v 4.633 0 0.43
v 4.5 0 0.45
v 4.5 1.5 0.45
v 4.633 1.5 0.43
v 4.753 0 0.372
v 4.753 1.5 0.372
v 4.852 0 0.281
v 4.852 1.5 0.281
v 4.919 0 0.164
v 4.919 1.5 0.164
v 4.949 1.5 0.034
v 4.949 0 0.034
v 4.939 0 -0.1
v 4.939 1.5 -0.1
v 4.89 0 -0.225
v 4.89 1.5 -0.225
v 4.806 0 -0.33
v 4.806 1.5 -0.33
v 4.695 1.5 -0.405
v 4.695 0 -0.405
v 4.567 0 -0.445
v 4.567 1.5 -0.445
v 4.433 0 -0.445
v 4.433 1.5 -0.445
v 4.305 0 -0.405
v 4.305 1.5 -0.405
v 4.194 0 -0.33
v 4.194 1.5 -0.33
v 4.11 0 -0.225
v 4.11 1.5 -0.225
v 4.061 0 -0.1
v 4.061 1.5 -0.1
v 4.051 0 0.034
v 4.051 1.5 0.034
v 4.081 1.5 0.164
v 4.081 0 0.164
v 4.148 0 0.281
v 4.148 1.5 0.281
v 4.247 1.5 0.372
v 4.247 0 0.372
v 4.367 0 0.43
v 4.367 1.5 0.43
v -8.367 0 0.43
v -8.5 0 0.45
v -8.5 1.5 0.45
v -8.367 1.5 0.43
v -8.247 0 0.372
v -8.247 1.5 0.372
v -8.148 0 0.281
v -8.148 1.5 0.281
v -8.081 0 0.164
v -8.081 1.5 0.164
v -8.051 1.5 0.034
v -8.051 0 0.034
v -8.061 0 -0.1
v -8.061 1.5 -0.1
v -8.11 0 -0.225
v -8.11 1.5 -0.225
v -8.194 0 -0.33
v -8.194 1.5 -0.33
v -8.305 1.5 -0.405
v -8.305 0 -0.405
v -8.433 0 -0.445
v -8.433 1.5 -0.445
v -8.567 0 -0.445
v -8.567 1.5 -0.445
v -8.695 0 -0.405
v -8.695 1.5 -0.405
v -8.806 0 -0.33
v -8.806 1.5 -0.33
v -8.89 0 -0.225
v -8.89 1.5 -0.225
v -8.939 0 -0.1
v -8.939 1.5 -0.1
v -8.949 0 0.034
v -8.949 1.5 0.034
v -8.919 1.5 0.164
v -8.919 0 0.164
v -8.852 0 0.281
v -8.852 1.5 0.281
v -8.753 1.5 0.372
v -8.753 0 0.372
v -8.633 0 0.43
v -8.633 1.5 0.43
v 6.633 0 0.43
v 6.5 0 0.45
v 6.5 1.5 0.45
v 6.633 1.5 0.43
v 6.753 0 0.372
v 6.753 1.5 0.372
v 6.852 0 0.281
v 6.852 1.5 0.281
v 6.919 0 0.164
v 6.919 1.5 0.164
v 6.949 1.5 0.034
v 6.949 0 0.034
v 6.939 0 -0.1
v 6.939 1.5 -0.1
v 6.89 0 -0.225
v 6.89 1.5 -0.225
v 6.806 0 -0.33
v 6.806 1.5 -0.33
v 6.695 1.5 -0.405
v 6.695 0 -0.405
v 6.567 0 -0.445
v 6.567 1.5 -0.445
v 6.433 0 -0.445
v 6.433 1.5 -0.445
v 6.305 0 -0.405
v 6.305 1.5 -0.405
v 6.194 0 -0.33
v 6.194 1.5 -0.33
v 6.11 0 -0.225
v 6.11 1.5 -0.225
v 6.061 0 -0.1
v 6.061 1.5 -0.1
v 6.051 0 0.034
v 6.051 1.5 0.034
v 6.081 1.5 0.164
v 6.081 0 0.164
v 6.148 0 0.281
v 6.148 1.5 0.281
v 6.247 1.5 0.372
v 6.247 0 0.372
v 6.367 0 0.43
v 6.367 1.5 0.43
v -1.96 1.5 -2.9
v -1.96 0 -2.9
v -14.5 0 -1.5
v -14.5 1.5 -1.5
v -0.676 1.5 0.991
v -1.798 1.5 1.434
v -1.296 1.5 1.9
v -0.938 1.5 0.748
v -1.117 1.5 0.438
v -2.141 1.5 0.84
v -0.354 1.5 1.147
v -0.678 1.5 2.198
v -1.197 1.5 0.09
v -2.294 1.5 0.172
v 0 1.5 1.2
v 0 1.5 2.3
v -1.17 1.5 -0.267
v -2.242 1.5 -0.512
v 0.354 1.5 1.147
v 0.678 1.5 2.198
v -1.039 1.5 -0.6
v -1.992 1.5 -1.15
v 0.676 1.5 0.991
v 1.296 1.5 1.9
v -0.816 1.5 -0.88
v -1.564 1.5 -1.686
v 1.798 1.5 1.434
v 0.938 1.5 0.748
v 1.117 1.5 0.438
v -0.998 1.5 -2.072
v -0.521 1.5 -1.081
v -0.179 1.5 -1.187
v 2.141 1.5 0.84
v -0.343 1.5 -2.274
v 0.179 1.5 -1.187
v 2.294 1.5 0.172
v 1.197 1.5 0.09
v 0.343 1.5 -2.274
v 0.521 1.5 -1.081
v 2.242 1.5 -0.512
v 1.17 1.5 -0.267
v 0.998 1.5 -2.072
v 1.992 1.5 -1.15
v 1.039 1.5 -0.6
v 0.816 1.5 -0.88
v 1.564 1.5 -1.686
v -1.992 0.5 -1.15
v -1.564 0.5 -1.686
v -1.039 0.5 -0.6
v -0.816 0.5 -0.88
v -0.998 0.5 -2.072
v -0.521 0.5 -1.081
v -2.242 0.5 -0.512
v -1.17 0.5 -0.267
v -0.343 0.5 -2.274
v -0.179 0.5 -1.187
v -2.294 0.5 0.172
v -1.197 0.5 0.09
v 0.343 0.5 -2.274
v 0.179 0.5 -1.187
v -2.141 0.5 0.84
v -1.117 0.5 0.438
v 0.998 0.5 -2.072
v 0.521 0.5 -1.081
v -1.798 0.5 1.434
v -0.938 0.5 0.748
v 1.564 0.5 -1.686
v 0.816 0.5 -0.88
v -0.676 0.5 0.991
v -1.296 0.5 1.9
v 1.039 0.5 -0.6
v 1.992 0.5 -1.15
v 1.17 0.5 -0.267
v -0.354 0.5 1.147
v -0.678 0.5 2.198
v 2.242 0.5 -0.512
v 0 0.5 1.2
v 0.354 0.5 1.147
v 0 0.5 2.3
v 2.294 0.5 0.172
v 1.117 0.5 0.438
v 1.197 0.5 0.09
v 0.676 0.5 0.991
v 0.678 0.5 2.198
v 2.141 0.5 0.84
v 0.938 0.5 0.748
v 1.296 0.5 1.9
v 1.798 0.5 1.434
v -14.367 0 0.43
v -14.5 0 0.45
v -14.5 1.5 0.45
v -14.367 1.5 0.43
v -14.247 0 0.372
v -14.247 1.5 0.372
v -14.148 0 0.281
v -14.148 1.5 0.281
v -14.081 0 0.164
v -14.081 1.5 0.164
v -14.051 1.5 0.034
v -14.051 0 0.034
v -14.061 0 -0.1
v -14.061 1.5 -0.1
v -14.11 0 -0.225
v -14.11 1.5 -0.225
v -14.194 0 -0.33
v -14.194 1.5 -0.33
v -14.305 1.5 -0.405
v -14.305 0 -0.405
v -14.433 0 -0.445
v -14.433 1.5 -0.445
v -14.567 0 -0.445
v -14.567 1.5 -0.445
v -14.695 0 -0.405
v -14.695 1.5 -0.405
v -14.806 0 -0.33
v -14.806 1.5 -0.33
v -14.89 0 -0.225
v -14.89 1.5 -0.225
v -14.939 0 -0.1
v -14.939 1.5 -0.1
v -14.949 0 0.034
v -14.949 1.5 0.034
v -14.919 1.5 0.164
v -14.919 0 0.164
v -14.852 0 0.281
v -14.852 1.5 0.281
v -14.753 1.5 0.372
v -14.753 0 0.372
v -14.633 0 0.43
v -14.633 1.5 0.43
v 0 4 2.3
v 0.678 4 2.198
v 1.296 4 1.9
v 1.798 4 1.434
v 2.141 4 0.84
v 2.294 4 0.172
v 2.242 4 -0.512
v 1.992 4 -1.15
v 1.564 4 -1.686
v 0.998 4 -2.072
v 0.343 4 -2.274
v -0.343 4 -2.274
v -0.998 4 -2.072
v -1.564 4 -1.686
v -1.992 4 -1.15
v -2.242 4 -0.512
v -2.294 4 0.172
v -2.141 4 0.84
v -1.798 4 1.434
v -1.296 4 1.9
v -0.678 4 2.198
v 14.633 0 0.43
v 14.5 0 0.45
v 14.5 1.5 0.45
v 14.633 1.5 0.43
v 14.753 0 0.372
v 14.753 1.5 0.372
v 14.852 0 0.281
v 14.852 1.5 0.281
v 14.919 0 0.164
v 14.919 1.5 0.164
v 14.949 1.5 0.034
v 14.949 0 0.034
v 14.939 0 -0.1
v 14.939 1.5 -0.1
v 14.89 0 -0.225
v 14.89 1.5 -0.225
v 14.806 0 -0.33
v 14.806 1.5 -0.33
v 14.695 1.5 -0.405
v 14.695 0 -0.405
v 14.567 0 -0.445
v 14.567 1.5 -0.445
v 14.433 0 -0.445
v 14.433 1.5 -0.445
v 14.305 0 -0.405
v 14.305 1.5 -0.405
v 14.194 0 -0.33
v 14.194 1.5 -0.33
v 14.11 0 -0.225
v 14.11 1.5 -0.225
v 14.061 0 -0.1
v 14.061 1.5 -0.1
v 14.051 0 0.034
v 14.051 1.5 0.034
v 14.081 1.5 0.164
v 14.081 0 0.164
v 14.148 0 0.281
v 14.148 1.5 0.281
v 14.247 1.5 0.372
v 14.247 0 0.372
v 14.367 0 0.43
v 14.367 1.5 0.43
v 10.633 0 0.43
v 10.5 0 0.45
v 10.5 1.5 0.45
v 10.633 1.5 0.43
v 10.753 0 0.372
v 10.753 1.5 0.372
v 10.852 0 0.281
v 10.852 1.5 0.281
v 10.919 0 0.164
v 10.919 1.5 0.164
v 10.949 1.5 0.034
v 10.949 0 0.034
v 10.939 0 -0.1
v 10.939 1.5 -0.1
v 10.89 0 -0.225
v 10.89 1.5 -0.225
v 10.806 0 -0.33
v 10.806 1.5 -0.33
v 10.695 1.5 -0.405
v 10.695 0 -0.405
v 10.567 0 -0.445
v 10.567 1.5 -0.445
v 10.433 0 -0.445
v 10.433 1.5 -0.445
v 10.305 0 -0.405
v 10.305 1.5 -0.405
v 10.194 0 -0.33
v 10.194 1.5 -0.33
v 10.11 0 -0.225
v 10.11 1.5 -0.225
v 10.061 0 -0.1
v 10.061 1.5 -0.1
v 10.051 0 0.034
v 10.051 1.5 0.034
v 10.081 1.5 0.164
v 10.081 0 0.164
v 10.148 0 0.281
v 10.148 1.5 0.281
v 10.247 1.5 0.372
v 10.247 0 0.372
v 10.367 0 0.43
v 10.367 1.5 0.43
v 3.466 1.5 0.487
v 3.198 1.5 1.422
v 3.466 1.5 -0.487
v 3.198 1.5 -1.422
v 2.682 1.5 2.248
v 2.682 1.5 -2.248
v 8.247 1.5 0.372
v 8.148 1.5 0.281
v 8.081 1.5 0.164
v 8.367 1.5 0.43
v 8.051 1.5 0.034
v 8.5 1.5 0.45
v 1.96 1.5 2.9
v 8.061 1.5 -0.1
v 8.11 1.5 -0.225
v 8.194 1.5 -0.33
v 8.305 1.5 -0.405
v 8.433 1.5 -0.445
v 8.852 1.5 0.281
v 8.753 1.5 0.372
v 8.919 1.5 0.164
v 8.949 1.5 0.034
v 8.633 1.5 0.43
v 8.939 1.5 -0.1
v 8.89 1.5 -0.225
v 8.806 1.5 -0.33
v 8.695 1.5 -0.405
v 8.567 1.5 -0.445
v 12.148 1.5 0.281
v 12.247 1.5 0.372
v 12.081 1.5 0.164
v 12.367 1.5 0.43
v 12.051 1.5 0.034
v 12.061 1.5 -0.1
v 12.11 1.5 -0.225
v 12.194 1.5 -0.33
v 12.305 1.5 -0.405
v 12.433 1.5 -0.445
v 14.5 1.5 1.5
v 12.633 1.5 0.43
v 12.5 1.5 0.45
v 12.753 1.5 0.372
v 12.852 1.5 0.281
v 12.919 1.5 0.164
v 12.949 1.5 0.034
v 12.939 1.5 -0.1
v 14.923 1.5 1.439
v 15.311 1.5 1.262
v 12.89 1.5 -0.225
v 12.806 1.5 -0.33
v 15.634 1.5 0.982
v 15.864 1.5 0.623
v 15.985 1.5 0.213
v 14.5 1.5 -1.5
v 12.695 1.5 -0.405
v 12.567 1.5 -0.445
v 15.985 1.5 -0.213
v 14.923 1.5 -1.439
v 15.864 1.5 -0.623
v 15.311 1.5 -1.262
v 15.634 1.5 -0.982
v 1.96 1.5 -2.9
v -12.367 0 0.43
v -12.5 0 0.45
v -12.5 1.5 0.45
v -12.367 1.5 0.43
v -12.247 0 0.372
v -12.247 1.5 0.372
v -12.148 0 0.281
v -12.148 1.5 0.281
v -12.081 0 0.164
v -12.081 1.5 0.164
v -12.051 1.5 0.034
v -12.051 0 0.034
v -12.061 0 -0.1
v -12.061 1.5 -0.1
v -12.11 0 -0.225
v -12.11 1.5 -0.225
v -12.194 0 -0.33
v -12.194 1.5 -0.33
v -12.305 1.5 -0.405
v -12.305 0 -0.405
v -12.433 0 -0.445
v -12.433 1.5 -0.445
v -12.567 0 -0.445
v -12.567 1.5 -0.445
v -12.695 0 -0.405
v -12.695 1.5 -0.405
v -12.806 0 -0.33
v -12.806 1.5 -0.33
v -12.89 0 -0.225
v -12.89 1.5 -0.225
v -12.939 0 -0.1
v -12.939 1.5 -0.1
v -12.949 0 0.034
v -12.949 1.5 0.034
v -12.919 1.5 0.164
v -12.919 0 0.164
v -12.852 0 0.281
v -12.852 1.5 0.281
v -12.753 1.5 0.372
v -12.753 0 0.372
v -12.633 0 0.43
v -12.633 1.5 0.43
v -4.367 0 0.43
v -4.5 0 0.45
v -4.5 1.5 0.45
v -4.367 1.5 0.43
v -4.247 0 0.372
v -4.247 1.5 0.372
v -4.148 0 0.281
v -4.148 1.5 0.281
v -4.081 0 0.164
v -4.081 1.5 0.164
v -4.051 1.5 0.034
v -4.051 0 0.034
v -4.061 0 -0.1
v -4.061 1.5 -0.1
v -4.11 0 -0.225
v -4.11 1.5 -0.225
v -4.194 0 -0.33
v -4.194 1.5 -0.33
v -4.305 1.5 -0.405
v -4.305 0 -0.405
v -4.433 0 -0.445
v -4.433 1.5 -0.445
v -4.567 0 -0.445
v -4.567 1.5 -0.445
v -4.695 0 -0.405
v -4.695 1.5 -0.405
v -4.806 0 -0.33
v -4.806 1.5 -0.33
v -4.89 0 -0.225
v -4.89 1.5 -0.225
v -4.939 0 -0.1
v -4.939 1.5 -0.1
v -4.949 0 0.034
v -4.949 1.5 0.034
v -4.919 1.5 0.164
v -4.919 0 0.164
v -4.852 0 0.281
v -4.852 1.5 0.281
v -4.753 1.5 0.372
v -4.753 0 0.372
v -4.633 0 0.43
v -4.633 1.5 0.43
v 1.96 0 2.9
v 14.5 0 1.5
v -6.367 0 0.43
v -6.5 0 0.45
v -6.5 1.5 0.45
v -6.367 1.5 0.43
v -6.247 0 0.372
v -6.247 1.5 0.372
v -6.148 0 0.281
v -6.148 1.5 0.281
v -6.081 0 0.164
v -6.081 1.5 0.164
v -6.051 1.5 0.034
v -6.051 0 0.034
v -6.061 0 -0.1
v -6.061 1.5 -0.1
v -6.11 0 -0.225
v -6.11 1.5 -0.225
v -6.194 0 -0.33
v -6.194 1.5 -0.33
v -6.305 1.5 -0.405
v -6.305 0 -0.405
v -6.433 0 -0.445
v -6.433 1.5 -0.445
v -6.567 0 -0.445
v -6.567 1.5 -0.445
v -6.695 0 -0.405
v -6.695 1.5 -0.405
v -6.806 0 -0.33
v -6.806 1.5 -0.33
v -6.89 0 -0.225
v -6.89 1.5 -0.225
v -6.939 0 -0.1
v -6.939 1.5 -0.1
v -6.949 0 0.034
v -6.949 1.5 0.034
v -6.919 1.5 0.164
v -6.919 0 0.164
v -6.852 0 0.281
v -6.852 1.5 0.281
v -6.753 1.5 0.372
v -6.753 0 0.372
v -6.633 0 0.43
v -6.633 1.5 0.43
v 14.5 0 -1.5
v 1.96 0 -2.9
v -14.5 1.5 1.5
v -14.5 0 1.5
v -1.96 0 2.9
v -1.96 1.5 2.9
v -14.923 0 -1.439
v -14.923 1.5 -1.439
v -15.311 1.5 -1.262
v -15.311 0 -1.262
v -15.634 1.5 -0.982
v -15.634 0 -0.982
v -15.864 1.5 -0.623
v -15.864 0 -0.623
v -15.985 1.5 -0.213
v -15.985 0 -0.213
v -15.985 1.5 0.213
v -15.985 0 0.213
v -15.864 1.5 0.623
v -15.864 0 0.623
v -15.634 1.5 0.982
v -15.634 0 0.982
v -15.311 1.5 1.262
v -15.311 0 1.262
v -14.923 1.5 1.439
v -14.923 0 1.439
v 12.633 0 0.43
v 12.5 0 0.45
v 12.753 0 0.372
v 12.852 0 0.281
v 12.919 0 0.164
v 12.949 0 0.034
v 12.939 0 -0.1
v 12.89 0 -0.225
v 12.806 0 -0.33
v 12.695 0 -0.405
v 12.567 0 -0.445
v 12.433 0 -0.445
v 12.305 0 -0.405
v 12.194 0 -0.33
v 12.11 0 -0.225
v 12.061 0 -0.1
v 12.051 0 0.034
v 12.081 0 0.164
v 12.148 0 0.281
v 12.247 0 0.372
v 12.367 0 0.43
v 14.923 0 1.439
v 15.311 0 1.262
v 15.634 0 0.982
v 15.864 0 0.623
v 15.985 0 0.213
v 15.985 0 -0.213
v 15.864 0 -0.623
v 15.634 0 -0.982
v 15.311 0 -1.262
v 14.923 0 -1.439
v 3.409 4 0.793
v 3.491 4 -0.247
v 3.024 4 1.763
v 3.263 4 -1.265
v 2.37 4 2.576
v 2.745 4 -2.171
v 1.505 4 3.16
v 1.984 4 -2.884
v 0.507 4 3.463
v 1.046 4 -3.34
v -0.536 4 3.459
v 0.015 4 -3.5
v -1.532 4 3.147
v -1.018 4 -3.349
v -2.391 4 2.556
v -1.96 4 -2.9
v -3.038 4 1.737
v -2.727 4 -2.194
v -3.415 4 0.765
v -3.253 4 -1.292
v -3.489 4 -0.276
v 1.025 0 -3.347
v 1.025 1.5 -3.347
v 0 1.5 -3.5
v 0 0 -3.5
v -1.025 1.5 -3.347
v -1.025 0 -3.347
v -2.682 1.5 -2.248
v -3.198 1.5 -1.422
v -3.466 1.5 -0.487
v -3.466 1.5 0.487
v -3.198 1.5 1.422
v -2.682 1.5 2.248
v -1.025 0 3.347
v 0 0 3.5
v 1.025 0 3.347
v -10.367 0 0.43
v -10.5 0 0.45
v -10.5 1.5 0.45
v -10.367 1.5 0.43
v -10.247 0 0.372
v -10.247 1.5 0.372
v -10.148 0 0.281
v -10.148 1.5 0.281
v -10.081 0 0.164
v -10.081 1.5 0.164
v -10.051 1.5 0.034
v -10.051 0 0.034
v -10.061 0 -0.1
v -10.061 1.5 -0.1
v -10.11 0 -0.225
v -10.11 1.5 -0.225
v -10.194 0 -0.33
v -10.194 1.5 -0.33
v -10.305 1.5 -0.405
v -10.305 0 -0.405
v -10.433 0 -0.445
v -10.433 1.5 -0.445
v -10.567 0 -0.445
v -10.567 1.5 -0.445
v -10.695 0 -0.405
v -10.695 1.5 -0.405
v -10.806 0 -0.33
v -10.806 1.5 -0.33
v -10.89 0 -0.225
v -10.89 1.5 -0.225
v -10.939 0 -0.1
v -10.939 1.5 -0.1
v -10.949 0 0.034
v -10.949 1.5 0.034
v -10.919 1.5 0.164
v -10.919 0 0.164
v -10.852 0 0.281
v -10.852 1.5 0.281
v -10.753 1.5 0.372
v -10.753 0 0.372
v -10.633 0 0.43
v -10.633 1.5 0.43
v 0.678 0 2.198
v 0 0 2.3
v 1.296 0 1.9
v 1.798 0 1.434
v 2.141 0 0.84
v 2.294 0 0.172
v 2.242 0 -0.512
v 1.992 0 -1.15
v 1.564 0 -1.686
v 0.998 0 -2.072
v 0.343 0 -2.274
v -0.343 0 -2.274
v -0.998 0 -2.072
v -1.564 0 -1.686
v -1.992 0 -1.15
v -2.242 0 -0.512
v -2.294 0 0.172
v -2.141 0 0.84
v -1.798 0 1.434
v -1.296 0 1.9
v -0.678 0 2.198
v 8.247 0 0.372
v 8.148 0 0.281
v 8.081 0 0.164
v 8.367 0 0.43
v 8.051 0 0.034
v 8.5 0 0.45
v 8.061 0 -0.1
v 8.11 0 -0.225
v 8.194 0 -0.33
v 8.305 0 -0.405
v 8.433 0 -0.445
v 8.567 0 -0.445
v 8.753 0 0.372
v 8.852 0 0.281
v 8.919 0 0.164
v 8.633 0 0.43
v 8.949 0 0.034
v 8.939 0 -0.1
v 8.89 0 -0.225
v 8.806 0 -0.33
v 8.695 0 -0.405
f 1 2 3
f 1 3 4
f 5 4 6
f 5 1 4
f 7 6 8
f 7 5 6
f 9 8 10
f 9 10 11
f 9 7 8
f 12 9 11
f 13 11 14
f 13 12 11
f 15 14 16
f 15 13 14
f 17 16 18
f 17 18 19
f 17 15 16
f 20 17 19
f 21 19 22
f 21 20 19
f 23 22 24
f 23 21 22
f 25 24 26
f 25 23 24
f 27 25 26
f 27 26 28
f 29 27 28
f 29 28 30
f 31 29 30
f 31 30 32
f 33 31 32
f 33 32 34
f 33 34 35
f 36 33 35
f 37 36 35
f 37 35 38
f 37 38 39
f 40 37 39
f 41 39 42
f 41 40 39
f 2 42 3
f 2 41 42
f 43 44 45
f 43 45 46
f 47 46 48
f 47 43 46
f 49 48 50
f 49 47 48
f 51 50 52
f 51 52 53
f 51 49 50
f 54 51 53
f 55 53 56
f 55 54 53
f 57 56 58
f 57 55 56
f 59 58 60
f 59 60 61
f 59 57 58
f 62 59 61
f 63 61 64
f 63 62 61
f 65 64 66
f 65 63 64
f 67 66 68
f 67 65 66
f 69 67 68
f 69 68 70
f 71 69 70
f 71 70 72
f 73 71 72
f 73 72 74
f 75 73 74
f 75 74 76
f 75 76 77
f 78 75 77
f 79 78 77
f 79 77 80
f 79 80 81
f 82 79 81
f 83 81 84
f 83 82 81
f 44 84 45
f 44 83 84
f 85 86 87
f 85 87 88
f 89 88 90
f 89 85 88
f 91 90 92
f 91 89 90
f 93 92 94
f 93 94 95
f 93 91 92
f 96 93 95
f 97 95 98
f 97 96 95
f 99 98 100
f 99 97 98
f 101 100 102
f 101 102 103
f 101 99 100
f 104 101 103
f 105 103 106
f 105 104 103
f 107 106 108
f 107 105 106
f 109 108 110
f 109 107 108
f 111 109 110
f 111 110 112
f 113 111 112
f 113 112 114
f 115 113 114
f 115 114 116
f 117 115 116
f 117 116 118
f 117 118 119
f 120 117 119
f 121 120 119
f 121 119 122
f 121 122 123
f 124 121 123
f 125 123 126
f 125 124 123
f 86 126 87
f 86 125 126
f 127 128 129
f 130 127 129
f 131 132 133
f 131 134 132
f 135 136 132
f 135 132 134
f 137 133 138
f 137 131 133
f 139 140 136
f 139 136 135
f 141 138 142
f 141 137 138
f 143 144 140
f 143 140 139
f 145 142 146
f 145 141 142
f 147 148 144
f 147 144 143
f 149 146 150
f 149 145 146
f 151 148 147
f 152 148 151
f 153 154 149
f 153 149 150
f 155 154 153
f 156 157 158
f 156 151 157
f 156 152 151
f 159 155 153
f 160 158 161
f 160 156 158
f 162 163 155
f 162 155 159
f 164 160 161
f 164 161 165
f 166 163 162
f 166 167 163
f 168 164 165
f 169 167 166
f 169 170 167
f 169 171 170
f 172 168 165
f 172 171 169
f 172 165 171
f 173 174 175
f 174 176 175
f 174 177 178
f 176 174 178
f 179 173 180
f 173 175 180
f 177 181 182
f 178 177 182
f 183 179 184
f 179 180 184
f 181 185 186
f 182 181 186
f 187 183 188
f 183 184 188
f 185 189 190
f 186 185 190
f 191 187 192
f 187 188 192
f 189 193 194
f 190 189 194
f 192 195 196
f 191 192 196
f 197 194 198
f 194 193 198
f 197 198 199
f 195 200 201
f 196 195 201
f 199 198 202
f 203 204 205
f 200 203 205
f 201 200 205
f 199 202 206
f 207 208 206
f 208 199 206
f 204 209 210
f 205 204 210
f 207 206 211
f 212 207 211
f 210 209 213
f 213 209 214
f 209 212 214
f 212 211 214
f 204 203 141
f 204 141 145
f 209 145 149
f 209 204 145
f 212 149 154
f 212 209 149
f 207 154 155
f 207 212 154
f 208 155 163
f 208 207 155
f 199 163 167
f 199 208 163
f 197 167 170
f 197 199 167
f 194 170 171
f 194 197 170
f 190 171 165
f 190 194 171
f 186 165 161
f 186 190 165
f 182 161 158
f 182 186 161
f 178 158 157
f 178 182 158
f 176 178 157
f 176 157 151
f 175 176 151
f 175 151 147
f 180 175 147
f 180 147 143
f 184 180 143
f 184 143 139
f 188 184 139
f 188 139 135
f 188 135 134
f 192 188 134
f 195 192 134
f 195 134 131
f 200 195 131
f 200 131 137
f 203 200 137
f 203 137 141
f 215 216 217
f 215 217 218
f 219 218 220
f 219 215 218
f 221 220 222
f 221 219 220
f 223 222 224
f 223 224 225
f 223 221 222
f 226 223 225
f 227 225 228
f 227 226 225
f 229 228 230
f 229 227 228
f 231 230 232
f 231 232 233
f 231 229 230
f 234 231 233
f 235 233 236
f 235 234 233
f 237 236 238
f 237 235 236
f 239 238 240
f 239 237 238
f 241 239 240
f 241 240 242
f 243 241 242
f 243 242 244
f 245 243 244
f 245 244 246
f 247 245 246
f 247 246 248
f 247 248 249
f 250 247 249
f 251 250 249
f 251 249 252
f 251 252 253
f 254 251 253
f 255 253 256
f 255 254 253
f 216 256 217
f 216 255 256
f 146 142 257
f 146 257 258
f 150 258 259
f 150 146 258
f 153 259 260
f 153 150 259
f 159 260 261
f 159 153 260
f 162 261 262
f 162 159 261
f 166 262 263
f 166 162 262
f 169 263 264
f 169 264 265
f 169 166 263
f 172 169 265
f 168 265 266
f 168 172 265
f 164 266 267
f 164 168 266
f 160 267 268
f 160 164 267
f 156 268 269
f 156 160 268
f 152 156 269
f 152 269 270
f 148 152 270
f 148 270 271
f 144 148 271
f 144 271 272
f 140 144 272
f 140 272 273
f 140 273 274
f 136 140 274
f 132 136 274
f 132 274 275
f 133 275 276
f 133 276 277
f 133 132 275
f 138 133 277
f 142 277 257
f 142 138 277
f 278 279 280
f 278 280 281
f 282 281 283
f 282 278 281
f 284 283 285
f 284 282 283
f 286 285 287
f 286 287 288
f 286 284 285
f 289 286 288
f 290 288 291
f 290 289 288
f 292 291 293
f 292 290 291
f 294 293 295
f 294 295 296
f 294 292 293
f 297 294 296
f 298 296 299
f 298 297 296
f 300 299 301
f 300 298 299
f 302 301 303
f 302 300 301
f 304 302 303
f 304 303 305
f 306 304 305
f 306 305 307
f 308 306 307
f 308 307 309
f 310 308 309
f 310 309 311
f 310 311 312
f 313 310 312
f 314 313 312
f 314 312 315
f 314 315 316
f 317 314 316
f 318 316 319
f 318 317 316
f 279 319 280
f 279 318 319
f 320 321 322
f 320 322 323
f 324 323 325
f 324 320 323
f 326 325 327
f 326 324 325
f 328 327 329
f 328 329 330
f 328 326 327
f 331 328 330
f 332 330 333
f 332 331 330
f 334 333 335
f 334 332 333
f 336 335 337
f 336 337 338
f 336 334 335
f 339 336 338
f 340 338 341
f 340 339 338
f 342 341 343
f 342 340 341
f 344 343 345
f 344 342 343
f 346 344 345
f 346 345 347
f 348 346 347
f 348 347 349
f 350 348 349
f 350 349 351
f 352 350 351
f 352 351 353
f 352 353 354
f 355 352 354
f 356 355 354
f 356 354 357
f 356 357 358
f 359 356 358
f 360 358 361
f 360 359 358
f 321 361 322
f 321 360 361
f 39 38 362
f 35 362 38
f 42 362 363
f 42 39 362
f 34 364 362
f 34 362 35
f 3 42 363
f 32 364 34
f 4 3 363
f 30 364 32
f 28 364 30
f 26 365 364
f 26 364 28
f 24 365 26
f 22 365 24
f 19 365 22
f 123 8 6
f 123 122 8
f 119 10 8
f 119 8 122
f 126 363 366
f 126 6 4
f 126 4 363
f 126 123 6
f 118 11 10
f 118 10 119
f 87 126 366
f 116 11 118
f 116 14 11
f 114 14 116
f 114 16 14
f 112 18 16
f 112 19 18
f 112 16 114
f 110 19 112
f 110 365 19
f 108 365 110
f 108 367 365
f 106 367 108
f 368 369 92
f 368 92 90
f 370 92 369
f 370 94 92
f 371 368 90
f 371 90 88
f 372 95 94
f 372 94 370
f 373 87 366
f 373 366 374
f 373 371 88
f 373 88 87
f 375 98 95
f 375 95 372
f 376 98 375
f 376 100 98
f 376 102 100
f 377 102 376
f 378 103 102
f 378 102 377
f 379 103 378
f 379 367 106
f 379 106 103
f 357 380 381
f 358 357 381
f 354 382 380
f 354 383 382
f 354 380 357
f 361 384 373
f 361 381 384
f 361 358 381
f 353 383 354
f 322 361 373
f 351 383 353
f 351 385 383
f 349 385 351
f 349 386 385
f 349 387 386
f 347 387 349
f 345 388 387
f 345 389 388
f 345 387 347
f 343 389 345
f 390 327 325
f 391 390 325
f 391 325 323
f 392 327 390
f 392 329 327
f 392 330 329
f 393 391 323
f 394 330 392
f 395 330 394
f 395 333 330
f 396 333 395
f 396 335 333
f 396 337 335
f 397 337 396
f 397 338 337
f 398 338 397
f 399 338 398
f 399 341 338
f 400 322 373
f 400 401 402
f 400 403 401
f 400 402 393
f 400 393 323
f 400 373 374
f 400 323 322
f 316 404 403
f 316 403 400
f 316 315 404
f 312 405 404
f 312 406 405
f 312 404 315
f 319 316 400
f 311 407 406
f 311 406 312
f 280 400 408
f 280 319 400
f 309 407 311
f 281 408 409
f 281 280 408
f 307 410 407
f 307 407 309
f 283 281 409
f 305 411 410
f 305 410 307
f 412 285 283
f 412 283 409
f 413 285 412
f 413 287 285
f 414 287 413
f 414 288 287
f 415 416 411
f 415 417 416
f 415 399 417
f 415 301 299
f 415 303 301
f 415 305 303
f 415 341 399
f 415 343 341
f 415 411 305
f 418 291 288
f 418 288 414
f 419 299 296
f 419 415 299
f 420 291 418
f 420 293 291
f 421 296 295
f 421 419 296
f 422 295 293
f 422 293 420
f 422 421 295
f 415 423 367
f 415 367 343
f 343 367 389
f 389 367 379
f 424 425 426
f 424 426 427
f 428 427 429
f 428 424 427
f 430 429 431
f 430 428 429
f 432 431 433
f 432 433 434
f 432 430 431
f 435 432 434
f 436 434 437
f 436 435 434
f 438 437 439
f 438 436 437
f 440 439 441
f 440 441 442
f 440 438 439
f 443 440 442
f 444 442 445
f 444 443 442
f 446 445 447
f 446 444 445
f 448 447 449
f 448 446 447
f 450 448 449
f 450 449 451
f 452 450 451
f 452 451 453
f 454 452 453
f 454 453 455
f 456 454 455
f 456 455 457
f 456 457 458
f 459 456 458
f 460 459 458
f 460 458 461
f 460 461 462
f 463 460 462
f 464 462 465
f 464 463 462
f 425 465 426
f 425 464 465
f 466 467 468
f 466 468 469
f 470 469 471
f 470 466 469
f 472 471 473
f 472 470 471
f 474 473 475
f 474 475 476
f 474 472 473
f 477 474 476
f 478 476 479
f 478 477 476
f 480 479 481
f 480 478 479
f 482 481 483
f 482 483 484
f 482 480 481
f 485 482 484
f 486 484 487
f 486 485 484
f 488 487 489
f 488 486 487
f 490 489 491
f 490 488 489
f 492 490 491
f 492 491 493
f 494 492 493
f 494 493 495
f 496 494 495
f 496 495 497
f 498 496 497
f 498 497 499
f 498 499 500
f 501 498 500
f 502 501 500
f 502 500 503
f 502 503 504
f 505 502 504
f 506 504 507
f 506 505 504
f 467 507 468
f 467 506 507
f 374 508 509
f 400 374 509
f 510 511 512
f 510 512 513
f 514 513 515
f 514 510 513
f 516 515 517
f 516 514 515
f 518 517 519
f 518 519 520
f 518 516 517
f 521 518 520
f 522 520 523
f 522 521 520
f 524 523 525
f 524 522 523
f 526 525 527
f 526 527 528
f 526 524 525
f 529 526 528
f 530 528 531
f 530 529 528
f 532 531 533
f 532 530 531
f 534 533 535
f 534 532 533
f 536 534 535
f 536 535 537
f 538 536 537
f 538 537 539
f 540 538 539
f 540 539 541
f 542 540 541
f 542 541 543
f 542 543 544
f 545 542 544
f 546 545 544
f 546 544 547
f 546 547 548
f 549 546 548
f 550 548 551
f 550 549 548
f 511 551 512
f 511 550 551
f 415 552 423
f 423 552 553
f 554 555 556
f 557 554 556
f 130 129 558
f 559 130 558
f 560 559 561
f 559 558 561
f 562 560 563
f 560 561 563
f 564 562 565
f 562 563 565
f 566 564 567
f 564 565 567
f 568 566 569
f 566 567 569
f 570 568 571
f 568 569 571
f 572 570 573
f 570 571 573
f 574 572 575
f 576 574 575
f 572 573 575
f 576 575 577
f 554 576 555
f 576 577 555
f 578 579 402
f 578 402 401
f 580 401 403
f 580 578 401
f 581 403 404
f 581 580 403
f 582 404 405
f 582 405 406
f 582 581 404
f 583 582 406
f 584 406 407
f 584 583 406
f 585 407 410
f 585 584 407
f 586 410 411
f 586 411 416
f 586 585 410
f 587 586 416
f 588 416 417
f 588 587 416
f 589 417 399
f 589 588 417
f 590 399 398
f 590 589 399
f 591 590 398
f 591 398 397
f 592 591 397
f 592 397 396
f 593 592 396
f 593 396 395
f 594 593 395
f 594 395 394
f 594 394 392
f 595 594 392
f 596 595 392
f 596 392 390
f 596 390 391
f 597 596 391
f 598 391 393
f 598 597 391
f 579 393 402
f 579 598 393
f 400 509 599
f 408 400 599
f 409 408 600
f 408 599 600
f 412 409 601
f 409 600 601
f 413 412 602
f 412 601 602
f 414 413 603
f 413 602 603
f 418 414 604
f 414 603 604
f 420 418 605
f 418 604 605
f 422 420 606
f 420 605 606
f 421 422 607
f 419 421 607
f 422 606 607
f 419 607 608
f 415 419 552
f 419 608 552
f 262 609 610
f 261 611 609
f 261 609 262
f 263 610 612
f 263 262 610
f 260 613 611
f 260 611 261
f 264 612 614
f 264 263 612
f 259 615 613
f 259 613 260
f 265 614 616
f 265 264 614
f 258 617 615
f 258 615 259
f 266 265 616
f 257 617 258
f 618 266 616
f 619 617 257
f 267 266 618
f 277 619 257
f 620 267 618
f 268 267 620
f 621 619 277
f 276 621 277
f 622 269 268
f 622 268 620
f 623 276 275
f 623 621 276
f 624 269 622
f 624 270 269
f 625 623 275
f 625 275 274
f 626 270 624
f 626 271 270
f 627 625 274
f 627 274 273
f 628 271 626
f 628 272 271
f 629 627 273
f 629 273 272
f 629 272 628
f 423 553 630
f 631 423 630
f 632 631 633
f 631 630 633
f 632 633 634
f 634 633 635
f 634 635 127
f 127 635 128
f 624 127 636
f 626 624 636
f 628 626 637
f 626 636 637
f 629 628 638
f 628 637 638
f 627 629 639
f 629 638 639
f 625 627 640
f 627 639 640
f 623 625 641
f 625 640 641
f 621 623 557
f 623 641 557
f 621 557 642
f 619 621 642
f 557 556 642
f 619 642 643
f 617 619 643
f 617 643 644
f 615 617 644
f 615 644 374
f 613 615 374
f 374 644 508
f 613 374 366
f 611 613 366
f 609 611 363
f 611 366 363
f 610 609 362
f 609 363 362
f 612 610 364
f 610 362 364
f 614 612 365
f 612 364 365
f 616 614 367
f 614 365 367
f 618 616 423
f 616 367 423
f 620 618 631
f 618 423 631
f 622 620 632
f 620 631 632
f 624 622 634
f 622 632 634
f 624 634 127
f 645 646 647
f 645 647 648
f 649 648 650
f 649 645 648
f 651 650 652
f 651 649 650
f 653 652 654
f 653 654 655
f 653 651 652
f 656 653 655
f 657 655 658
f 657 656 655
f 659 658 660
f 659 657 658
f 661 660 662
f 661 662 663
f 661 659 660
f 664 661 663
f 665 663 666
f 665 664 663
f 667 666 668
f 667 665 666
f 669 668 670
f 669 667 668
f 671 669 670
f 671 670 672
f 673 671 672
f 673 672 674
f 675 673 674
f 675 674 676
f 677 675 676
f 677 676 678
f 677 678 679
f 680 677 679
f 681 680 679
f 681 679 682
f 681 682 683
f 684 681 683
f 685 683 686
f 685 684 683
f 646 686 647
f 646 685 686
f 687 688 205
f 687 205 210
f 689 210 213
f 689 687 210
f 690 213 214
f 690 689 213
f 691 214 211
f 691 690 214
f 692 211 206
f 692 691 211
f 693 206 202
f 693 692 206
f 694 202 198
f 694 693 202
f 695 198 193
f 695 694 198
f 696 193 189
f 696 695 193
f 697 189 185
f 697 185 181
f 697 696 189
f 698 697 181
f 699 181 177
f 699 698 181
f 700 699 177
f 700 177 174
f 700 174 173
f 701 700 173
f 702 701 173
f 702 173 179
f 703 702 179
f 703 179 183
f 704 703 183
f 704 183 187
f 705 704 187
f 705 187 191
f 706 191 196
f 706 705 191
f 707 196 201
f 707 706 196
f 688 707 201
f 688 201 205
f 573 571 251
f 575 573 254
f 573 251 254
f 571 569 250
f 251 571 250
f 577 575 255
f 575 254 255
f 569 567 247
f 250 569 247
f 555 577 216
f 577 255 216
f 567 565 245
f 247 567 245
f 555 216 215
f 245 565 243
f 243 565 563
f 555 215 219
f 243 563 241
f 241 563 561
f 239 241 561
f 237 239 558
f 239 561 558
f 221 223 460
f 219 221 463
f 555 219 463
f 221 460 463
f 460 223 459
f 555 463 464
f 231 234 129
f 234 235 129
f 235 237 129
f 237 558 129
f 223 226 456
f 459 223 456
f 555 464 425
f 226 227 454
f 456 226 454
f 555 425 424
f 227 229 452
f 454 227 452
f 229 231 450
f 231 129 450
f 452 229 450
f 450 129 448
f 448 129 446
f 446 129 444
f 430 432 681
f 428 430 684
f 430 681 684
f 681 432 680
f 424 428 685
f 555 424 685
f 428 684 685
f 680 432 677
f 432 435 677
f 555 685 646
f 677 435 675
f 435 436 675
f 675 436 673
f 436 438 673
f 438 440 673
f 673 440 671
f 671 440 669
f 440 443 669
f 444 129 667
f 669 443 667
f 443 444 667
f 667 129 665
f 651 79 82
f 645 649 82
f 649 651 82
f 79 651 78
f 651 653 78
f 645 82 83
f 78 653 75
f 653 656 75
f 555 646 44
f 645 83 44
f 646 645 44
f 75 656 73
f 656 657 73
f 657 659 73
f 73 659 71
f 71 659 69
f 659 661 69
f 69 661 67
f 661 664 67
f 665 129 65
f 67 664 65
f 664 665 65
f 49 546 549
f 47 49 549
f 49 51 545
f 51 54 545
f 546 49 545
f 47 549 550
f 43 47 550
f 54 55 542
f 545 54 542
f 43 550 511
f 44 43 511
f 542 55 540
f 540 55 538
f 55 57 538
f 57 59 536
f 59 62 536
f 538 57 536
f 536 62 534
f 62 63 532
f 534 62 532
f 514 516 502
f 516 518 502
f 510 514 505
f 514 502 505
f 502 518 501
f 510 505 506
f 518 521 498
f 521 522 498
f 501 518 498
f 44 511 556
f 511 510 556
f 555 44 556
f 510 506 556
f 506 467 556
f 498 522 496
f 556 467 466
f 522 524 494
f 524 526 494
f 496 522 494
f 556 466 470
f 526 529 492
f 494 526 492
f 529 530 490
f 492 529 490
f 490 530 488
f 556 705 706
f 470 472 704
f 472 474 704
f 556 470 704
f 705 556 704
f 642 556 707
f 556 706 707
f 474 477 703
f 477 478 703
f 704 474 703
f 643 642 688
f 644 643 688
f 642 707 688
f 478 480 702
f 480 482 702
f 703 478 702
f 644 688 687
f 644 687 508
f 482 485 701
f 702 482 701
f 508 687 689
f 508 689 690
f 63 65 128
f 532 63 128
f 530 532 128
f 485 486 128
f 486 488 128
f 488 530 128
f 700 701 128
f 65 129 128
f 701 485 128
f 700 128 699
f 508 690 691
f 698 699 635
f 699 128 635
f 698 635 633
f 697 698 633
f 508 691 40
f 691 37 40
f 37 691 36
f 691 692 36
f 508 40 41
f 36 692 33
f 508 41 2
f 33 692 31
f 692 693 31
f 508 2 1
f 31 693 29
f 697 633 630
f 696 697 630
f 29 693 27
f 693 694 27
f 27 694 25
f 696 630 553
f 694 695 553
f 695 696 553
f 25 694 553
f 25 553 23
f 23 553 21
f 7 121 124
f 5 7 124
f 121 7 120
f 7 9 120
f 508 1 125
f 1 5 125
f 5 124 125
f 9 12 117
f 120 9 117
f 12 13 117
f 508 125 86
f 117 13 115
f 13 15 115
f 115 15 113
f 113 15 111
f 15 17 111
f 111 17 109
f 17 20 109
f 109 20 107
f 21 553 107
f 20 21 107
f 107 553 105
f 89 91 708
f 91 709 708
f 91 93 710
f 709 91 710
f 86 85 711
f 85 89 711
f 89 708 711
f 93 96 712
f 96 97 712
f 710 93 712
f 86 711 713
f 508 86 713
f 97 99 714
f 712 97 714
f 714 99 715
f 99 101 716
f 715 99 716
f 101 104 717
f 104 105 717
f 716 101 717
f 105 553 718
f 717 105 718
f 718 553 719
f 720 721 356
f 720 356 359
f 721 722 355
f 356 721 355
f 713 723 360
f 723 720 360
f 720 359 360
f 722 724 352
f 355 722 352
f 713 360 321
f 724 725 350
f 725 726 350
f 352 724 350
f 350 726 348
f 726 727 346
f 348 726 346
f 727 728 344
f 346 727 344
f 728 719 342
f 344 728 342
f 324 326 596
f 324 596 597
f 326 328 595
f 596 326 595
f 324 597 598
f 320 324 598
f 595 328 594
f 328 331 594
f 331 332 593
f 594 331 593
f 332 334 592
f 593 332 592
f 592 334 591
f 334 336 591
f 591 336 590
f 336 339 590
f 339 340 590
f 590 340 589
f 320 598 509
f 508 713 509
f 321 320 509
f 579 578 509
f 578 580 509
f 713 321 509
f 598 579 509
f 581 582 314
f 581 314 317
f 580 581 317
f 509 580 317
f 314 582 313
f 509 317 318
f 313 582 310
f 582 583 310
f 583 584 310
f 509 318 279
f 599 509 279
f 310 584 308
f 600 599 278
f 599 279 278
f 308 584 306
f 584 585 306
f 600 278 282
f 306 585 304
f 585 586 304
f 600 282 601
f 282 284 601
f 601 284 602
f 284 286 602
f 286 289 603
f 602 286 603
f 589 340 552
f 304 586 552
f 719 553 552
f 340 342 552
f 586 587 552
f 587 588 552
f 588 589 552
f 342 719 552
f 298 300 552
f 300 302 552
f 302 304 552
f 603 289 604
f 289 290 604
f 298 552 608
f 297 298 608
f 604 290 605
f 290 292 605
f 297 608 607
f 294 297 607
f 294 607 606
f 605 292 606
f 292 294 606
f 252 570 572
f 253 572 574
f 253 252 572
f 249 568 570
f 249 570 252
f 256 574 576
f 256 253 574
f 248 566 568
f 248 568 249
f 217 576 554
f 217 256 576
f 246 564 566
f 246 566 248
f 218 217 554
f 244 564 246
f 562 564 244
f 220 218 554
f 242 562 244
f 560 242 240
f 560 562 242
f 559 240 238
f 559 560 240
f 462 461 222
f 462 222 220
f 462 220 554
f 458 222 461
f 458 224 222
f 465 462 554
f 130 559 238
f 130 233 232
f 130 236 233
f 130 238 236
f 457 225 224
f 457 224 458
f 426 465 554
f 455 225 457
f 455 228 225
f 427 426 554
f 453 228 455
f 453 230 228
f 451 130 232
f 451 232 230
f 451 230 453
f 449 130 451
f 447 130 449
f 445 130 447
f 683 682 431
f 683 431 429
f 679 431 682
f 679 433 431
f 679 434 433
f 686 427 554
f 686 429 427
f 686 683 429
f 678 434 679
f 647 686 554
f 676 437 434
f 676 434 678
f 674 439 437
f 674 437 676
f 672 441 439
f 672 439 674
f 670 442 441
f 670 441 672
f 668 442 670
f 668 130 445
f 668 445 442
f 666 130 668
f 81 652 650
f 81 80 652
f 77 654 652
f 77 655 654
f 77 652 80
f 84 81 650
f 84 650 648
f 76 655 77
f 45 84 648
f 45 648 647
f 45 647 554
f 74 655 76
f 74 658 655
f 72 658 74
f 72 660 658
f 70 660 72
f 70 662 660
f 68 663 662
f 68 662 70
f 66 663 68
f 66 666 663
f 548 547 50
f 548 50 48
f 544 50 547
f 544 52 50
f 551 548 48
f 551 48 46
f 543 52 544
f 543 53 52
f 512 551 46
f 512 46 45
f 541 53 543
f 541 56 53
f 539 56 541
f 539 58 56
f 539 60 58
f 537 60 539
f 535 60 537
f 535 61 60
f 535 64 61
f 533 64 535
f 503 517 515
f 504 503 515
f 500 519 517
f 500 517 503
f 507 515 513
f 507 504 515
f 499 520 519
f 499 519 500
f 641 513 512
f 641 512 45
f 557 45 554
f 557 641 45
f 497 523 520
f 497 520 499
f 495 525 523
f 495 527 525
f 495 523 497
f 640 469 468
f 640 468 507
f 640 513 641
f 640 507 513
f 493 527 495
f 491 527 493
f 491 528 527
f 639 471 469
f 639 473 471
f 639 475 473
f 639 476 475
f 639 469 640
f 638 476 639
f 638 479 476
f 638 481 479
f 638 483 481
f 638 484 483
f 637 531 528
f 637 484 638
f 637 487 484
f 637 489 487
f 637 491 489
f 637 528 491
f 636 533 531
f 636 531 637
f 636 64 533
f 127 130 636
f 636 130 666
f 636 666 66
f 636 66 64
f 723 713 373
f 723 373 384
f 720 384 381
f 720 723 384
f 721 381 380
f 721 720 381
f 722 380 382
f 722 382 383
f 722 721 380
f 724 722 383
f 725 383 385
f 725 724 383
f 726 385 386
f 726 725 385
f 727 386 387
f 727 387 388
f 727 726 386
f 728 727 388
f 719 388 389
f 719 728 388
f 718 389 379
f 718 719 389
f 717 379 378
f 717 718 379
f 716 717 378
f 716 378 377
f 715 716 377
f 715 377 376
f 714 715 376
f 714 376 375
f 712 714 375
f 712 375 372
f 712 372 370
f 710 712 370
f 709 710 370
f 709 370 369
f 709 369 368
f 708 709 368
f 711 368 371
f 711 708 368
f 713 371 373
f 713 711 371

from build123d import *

# Parameters (mm, degrees)
SKETCH1_R           = 0.45
SKETCH1_R_2         = 3.5
SKETCH1_R_3         = 2.3
SKETCH1_R_4         = 1.2
BOSS_EXTRUDE1_DEPTH = 1.5
BOSS_EXTRUDE2_START = 1.5
SKETCH1_4_R         = 3.5
SKETCH1_4_R_2       = 2.3
BOSS_EXTRUDE2_DEPTH = 2.5
SKETCH1_5_R         = 2.3
SKETCH1_5_R_2       = 1.2
CUT_EXTRUDE1_DEPTH  = 0.5


with BuildPart() as part:
    # Sketch1 → Boss-Extrude1 (new body)
    # profile 1 of 4: a face of its own
    with BuildSketch(Plane(origin=(0, 0, 0), x_dir=(1, 0, 0), z_dir=(0, 1, 0))):
        with BuildLine():
            ThreePointArc((-1.959591794, -2.9), (-3.5, 0), (-1.959591794, 2.9))
            Line((-1.959591794, 2.9), (-14.5, 1.5))
            ThreePointArc((-14.5, 1.5), (-16, 0), (-14.5, -1.5))
            Line((-14.5, -1.5), (-1.959591794, -2.9))
        make_face()
        with Locations(Location((-14.5, 0, 0), (0, 0, 270))):
            Circle(SKETCH1_R, mode=Mode.SUBTRACT)
        with Locations(Location((-12.5, 0, 0), (0, 0, 270))):
            Circle(SKETCH1_R, mode=Mode.SUBTRACT)
        with Locations(Location((-10.5, 0, 0), (0, 0, 270))):
            Circle(SKETCH1_R, mode=Mode.SUBTRACT)
        with Locations(Location((-8.5, 0, 0), (0, 0, 270))):
            Circle(SKETCH1_R, mode=Mode.SUBTRACT)
        with Locations(Location((-6.5, 0, 0), (0, 0, 270))):
            Circle(SKETCH1_R, mode=Mode.SUBTRACT)
        with Locations(Location((-4.5, 0, 0), (0, 0, 270))):
            Circle(SKETCH1_R, mode=Mode.SUBTRACT)
    # profile 2 of 4: a face of its own
    with BuildSketch(Plane(origin=(0, 0, 0), x_dir=(1, 0, 0), z_dir=(0, 1, 0))):
        with BuildLine():
            Line((14.5, 1.5), (1.959591794, 2.9))
            ThreePointArc((1.959591794, 2.9), (3.091000751, 1.641863076), (3.5, 0))
            ThreePointArc((3.5, 0), (3.091000751, -1.641863076), (1.959591794, -2.9))
            Line((1.959591794, -2.9), (14.5, -1.5))
            ThreePointArc((14.5, -1.5), (16, 0), (14.5, 1.5))
        make_face()
        with Locations(Location((4.5, 0, 0), (0, 0, 270))):
            Circle(SKETCH1_R, mode=Mode.SUBTRACT)
        with Locations(Location((6.5, 0, 0), (0, 0, 270))):
            Circle(SKETCH1_R, mode=Mode.SUBTRACT)
        with Locations(Location((8.5, 0, 0), (0, 0, 270))):
            Circle(SKETCH1_R, mode=Mode.SUBTRACT)
        with Locations(Location((10.5, 0, 0), (0, 0, 270))):
            Circle(SKETCH1_R, mode=Mode.SUBTRACT)
        with Locations(Location((12.5, 0, 0), (0, 0, 270))):
            Circle(SKETCH1_R, mode=Mode.SUBTRACT)
        with Locations(Location((14.5, 0, 0), (0, 0, 270))):
            Circle(SKETCH1_R, mode=Mode.SUBTRACT)
    # profile 3 of 4: a face of its own
    with BuildSketch(Plane(origin=(0, 0, 0), x_dir=(1, 0, 0), z_dir=(0, 1, 0))):
        Circle(SKETCH1_R_2)
        Circle(SKETCH1_R_3, mode=Mode.SUBTRACT)
    # profile 4 of 4: a face of its own
    with BuildSketch(Plane(origin=(0, 0, 0), x_dir=(1, 0, 0), z_dir=(0, 1, 0))):
        Circle(SKETCH1_R_3)
        with Locations(Location((0, 0, 0), (0, 0, 270))):
            Circle(SKETCH1_R_4, mode=Mode.SUBTRACT)
    extrude(amount=BOSS_EXTRUDE1_DEPTH)

    # Sketch1<4> → Boss-Extrude2 (add)
    with BuildSketch(Plane(origin=(0, 0, 0), x_dir=(1, 0, 0), z_dir=(0, 1, 0)).offset(BOSS_EXTRUDE2_START)):
        with Locations(Location((0, 0, 0), (0, 0, 124.04773237))):
            Circle(SKETCH1_4_R)
        with Locations(Location((0, 0, 0), (0, 0, 270))):
            Circle(SKETCH1_4_R_2, mode=Mode.SUBTRACT)
    extrude(amount=BOSS_EXTRUDE2_DEPTH)

    # Sketch1<5> → Cut-Extrude1 (cut)
    with BuildSketch(Plane(origin=(0, 0, 0), x_dir=(1, 0, 0), z_dir=(0, 1, 0))):
        with Locations(Location((0, 0, 0), (0, 0, 270))):
            Circle(SKETCH1_5_R)
        with Locations(Location((0, 0, 0), (0, 0, 270))):
            Circle(SKETCH1_5_R_2, mode=Mode.SUBTRACT)
    extrude(amount=CUT_EXTRUDE1_DEPTH, mode=Mode.SUBTRACT)


solid = part.part
